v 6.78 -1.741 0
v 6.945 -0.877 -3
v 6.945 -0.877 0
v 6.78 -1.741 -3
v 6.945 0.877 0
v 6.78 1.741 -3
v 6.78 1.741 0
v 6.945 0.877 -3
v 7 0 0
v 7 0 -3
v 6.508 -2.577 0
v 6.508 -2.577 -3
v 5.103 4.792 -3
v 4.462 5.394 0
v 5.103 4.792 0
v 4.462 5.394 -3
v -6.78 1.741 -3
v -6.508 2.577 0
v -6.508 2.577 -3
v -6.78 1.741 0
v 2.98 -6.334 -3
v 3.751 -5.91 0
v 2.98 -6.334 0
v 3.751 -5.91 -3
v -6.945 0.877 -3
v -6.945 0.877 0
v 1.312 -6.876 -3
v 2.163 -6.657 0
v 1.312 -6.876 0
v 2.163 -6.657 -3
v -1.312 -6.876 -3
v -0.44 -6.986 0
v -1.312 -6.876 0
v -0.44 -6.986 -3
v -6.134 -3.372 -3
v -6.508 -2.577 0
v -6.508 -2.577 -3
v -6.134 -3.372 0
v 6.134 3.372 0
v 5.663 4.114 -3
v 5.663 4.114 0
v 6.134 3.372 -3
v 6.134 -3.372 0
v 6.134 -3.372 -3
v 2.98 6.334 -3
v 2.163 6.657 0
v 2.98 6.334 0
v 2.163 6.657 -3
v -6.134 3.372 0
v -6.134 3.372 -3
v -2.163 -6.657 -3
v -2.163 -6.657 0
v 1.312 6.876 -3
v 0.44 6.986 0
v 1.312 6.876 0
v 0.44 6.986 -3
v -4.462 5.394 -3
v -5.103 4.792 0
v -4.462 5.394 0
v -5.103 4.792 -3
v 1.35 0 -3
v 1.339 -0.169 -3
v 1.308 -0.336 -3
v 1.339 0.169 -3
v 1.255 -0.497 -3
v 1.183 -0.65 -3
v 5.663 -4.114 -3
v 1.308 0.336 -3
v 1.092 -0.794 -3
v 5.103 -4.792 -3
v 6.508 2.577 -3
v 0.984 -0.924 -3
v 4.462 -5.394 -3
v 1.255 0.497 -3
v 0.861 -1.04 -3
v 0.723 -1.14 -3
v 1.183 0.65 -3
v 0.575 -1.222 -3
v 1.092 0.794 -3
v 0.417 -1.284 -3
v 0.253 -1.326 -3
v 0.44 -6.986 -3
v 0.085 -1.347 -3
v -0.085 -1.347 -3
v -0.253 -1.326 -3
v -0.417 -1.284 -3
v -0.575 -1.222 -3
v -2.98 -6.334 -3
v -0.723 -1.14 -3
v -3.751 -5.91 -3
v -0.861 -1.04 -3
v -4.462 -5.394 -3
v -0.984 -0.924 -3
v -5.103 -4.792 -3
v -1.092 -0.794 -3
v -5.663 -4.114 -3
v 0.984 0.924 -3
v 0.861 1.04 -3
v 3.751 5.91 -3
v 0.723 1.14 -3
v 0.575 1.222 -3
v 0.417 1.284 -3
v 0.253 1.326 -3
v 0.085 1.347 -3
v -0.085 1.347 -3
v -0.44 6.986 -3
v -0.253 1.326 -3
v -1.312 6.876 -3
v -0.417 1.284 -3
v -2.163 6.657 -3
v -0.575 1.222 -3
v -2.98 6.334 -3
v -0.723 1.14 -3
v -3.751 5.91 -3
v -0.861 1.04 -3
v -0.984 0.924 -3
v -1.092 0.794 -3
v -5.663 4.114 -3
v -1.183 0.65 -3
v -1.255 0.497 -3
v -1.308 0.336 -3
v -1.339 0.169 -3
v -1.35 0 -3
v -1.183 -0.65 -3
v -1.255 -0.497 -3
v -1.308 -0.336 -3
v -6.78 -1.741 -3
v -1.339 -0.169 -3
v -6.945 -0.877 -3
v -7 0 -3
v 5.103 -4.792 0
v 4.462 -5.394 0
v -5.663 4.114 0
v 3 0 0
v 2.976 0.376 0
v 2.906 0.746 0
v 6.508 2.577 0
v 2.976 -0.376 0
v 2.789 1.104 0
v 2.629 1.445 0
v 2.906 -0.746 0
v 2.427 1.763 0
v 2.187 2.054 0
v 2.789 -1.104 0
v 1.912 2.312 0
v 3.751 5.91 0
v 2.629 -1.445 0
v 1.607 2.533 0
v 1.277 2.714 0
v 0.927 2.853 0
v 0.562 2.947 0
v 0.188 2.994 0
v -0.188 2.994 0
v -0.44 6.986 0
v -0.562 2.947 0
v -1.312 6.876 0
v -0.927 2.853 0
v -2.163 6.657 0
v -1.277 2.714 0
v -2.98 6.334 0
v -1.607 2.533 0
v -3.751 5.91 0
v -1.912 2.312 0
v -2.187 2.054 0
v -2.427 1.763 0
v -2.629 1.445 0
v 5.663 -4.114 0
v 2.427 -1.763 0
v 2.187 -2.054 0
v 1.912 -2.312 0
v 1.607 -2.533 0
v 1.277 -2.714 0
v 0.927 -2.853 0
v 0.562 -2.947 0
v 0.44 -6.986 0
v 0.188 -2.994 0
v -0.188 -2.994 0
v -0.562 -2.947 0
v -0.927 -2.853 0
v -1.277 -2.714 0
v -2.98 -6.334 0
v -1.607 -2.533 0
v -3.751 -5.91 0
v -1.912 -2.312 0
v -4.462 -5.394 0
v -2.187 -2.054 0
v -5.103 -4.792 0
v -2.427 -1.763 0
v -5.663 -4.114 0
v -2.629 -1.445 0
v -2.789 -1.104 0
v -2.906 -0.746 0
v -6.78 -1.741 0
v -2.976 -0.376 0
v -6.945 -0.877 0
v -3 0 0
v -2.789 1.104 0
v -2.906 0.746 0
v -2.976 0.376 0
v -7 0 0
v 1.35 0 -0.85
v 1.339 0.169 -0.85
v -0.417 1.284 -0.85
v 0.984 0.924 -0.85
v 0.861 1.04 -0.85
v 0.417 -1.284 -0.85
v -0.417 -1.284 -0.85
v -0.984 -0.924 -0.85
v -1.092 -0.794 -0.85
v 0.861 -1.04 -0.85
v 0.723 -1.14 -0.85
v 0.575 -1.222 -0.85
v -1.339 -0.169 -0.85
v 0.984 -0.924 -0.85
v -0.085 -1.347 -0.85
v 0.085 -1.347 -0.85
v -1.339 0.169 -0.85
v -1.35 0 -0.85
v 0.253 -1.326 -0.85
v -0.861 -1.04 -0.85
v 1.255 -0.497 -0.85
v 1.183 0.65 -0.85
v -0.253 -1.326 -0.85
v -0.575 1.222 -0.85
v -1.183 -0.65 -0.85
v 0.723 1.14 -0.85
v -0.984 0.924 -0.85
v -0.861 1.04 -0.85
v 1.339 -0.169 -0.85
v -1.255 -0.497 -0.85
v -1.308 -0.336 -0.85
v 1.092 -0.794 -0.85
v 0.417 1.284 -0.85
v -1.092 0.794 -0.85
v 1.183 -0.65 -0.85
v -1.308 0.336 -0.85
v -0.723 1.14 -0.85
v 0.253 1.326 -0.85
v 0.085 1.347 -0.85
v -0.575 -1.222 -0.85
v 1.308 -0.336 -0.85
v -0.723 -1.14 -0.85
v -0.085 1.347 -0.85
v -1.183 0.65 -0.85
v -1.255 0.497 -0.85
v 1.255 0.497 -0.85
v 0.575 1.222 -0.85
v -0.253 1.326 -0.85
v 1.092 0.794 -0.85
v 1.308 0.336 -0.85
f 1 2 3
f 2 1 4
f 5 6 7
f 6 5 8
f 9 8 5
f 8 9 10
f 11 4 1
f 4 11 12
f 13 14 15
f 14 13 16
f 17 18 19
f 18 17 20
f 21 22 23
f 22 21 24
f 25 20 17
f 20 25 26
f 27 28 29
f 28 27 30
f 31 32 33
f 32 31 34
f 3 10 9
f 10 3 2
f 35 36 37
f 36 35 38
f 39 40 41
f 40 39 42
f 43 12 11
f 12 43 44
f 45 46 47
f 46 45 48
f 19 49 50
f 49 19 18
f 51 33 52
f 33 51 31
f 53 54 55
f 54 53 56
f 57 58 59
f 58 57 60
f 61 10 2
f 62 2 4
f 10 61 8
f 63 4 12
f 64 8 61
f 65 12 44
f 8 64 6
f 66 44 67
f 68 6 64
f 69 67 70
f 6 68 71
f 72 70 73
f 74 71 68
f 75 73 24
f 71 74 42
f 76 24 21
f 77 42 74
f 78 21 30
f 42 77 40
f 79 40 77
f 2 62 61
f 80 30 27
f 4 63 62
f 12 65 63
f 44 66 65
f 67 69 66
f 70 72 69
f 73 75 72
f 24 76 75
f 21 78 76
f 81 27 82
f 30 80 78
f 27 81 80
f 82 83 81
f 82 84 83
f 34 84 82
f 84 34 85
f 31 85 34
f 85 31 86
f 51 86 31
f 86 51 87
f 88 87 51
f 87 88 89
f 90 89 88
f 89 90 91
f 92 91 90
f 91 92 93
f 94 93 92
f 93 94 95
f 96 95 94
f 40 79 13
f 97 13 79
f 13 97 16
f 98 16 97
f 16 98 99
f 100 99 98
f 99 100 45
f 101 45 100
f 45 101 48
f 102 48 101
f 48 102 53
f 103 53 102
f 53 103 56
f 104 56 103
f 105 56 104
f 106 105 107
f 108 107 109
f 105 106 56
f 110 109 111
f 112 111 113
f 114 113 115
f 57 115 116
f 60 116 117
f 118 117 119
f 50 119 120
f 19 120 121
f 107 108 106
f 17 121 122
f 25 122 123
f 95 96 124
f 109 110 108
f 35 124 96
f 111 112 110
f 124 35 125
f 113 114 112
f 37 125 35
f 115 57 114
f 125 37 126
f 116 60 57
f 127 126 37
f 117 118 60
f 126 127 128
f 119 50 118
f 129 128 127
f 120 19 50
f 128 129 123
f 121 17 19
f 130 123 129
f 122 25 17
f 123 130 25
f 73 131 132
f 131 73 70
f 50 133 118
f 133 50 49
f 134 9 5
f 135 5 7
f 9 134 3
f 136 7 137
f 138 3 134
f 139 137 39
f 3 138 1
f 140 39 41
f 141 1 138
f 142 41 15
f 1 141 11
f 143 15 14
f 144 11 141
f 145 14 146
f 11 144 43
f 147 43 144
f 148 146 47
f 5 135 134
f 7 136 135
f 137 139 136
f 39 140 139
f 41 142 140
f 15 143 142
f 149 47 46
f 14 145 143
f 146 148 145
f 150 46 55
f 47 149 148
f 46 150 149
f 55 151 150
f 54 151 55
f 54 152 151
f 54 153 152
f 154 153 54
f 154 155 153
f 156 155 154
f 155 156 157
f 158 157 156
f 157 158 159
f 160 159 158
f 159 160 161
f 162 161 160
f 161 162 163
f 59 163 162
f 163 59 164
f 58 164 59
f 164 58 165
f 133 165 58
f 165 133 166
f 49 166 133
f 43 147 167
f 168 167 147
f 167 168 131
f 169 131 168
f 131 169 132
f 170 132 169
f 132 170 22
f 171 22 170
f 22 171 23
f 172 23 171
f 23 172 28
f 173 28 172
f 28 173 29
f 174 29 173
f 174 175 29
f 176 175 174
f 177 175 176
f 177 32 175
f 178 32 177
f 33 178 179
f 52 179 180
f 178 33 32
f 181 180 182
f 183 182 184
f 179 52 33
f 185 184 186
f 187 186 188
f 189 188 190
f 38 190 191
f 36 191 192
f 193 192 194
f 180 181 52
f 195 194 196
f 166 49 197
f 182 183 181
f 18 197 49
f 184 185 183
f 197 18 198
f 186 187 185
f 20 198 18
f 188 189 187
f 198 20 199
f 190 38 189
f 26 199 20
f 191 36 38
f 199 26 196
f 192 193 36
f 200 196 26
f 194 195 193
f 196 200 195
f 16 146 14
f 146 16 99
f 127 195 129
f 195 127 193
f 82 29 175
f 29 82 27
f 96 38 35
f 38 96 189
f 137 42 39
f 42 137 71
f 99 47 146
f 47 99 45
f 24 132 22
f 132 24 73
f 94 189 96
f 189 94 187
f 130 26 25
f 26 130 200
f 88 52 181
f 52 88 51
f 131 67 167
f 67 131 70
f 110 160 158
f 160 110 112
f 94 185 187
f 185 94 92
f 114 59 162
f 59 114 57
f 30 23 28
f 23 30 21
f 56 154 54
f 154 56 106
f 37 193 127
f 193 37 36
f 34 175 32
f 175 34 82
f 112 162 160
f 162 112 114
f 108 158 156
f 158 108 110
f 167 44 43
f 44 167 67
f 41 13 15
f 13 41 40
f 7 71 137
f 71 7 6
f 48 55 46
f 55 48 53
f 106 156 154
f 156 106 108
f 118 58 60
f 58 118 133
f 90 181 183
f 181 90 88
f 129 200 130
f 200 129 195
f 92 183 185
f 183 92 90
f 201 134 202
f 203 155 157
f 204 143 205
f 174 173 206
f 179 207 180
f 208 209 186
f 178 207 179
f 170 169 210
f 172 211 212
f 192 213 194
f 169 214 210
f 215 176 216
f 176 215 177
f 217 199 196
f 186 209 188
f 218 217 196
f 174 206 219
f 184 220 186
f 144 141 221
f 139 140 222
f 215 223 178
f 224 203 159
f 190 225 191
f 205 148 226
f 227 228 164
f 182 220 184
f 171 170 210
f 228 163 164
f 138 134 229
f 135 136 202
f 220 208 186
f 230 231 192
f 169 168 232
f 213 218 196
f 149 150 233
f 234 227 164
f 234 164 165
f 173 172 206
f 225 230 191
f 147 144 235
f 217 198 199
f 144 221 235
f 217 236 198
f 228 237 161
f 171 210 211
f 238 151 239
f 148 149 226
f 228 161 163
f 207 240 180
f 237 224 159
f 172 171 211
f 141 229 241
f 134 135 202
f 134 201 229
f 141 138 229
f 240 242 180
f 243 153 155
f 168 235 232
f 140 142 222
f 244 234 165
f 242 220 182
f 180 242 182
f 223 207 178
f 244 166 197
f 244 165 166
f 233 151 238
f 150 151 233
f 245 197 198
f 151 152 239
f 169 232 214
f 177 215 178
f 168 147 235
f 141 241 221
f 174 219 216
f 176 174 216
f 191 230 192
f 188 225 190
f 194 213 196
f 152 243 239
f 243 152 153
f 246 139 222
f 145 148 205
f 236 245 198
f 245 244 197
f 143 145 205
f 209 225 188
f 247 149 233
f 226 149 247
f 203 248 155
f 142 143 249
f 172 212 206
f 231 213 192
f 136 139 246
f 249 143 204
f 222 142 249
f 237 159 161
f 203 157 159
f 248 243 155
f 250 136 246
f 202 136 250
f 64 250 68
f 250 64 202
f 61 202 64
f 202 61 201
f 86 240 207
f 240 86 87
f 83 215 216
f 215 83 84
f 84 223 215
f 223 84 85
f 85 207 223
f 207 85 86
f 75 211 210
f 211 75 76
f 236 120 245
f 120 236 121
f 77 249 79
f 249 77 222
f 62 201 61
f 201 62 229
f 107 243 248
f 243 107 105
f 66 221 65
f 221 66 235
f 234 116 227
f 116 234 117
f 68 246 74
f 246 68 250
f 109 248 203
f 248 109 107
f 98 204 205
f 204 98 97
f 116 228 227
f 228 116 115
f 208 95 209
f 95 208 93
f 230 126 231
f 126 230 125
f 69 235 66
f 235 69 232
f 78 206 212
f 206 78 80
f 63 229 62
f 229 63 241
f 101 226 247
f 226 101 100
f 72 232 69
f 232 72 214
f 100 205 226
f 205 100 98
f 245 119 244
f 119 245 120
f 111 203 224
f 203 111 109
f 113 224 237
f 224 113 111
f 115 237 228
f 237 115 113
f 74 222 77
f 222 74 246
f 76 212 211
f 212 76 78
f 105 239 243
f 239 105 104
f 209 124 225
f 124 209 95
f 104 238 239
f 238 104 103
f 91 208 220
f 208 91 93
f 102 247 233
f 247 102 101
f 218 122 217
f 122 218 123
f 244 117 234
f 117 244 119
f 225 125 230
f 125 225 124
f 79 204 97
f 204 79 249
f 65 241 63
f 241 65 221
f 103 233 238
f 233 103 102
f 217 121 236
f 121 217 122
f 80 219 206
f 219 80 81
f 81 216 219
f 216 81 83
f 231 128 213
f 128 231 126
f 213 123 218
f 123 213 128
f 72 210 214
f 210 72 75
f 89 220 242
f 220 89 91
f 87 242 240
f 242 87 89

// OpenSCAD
$fn = 50;


difference() {
	union() {
		translate(v = [0, 0, -3.0000000000]) {
			cylinder(h = 3, r = 7.0000000000);
		}
		translate(v = [0, 0, -3.0000000000]) {
			cylinder(h = 3, r = 2.8750000000);
		}
	}
	union() {
		translate(v = [0, 0, 0]) {
			rotate(a = [0, 0, 0]) {
				difference() {
					union() {
						translate(v = [0, 0, -3.0000000000]) {
							cylinder(h = 3, r = 1.0000000000);
						}
						translate(v = [0, 0, -0.8500000000]) {
							cylinder(h = 0.8500000000, r1 = 1.3500000000, r2 = 3.0000000000);
						}
						translate(v = [0, 0, -3.0000000000]) {
							cylinder(h = 3, r = 1.3500000000);
						}
						translate(v = [0, 0, -3.0000000000]) {
							cylinder(h = 3, r = 1.0000000000);
						}
					}
					union();
				}
			}
		}
	}
}
